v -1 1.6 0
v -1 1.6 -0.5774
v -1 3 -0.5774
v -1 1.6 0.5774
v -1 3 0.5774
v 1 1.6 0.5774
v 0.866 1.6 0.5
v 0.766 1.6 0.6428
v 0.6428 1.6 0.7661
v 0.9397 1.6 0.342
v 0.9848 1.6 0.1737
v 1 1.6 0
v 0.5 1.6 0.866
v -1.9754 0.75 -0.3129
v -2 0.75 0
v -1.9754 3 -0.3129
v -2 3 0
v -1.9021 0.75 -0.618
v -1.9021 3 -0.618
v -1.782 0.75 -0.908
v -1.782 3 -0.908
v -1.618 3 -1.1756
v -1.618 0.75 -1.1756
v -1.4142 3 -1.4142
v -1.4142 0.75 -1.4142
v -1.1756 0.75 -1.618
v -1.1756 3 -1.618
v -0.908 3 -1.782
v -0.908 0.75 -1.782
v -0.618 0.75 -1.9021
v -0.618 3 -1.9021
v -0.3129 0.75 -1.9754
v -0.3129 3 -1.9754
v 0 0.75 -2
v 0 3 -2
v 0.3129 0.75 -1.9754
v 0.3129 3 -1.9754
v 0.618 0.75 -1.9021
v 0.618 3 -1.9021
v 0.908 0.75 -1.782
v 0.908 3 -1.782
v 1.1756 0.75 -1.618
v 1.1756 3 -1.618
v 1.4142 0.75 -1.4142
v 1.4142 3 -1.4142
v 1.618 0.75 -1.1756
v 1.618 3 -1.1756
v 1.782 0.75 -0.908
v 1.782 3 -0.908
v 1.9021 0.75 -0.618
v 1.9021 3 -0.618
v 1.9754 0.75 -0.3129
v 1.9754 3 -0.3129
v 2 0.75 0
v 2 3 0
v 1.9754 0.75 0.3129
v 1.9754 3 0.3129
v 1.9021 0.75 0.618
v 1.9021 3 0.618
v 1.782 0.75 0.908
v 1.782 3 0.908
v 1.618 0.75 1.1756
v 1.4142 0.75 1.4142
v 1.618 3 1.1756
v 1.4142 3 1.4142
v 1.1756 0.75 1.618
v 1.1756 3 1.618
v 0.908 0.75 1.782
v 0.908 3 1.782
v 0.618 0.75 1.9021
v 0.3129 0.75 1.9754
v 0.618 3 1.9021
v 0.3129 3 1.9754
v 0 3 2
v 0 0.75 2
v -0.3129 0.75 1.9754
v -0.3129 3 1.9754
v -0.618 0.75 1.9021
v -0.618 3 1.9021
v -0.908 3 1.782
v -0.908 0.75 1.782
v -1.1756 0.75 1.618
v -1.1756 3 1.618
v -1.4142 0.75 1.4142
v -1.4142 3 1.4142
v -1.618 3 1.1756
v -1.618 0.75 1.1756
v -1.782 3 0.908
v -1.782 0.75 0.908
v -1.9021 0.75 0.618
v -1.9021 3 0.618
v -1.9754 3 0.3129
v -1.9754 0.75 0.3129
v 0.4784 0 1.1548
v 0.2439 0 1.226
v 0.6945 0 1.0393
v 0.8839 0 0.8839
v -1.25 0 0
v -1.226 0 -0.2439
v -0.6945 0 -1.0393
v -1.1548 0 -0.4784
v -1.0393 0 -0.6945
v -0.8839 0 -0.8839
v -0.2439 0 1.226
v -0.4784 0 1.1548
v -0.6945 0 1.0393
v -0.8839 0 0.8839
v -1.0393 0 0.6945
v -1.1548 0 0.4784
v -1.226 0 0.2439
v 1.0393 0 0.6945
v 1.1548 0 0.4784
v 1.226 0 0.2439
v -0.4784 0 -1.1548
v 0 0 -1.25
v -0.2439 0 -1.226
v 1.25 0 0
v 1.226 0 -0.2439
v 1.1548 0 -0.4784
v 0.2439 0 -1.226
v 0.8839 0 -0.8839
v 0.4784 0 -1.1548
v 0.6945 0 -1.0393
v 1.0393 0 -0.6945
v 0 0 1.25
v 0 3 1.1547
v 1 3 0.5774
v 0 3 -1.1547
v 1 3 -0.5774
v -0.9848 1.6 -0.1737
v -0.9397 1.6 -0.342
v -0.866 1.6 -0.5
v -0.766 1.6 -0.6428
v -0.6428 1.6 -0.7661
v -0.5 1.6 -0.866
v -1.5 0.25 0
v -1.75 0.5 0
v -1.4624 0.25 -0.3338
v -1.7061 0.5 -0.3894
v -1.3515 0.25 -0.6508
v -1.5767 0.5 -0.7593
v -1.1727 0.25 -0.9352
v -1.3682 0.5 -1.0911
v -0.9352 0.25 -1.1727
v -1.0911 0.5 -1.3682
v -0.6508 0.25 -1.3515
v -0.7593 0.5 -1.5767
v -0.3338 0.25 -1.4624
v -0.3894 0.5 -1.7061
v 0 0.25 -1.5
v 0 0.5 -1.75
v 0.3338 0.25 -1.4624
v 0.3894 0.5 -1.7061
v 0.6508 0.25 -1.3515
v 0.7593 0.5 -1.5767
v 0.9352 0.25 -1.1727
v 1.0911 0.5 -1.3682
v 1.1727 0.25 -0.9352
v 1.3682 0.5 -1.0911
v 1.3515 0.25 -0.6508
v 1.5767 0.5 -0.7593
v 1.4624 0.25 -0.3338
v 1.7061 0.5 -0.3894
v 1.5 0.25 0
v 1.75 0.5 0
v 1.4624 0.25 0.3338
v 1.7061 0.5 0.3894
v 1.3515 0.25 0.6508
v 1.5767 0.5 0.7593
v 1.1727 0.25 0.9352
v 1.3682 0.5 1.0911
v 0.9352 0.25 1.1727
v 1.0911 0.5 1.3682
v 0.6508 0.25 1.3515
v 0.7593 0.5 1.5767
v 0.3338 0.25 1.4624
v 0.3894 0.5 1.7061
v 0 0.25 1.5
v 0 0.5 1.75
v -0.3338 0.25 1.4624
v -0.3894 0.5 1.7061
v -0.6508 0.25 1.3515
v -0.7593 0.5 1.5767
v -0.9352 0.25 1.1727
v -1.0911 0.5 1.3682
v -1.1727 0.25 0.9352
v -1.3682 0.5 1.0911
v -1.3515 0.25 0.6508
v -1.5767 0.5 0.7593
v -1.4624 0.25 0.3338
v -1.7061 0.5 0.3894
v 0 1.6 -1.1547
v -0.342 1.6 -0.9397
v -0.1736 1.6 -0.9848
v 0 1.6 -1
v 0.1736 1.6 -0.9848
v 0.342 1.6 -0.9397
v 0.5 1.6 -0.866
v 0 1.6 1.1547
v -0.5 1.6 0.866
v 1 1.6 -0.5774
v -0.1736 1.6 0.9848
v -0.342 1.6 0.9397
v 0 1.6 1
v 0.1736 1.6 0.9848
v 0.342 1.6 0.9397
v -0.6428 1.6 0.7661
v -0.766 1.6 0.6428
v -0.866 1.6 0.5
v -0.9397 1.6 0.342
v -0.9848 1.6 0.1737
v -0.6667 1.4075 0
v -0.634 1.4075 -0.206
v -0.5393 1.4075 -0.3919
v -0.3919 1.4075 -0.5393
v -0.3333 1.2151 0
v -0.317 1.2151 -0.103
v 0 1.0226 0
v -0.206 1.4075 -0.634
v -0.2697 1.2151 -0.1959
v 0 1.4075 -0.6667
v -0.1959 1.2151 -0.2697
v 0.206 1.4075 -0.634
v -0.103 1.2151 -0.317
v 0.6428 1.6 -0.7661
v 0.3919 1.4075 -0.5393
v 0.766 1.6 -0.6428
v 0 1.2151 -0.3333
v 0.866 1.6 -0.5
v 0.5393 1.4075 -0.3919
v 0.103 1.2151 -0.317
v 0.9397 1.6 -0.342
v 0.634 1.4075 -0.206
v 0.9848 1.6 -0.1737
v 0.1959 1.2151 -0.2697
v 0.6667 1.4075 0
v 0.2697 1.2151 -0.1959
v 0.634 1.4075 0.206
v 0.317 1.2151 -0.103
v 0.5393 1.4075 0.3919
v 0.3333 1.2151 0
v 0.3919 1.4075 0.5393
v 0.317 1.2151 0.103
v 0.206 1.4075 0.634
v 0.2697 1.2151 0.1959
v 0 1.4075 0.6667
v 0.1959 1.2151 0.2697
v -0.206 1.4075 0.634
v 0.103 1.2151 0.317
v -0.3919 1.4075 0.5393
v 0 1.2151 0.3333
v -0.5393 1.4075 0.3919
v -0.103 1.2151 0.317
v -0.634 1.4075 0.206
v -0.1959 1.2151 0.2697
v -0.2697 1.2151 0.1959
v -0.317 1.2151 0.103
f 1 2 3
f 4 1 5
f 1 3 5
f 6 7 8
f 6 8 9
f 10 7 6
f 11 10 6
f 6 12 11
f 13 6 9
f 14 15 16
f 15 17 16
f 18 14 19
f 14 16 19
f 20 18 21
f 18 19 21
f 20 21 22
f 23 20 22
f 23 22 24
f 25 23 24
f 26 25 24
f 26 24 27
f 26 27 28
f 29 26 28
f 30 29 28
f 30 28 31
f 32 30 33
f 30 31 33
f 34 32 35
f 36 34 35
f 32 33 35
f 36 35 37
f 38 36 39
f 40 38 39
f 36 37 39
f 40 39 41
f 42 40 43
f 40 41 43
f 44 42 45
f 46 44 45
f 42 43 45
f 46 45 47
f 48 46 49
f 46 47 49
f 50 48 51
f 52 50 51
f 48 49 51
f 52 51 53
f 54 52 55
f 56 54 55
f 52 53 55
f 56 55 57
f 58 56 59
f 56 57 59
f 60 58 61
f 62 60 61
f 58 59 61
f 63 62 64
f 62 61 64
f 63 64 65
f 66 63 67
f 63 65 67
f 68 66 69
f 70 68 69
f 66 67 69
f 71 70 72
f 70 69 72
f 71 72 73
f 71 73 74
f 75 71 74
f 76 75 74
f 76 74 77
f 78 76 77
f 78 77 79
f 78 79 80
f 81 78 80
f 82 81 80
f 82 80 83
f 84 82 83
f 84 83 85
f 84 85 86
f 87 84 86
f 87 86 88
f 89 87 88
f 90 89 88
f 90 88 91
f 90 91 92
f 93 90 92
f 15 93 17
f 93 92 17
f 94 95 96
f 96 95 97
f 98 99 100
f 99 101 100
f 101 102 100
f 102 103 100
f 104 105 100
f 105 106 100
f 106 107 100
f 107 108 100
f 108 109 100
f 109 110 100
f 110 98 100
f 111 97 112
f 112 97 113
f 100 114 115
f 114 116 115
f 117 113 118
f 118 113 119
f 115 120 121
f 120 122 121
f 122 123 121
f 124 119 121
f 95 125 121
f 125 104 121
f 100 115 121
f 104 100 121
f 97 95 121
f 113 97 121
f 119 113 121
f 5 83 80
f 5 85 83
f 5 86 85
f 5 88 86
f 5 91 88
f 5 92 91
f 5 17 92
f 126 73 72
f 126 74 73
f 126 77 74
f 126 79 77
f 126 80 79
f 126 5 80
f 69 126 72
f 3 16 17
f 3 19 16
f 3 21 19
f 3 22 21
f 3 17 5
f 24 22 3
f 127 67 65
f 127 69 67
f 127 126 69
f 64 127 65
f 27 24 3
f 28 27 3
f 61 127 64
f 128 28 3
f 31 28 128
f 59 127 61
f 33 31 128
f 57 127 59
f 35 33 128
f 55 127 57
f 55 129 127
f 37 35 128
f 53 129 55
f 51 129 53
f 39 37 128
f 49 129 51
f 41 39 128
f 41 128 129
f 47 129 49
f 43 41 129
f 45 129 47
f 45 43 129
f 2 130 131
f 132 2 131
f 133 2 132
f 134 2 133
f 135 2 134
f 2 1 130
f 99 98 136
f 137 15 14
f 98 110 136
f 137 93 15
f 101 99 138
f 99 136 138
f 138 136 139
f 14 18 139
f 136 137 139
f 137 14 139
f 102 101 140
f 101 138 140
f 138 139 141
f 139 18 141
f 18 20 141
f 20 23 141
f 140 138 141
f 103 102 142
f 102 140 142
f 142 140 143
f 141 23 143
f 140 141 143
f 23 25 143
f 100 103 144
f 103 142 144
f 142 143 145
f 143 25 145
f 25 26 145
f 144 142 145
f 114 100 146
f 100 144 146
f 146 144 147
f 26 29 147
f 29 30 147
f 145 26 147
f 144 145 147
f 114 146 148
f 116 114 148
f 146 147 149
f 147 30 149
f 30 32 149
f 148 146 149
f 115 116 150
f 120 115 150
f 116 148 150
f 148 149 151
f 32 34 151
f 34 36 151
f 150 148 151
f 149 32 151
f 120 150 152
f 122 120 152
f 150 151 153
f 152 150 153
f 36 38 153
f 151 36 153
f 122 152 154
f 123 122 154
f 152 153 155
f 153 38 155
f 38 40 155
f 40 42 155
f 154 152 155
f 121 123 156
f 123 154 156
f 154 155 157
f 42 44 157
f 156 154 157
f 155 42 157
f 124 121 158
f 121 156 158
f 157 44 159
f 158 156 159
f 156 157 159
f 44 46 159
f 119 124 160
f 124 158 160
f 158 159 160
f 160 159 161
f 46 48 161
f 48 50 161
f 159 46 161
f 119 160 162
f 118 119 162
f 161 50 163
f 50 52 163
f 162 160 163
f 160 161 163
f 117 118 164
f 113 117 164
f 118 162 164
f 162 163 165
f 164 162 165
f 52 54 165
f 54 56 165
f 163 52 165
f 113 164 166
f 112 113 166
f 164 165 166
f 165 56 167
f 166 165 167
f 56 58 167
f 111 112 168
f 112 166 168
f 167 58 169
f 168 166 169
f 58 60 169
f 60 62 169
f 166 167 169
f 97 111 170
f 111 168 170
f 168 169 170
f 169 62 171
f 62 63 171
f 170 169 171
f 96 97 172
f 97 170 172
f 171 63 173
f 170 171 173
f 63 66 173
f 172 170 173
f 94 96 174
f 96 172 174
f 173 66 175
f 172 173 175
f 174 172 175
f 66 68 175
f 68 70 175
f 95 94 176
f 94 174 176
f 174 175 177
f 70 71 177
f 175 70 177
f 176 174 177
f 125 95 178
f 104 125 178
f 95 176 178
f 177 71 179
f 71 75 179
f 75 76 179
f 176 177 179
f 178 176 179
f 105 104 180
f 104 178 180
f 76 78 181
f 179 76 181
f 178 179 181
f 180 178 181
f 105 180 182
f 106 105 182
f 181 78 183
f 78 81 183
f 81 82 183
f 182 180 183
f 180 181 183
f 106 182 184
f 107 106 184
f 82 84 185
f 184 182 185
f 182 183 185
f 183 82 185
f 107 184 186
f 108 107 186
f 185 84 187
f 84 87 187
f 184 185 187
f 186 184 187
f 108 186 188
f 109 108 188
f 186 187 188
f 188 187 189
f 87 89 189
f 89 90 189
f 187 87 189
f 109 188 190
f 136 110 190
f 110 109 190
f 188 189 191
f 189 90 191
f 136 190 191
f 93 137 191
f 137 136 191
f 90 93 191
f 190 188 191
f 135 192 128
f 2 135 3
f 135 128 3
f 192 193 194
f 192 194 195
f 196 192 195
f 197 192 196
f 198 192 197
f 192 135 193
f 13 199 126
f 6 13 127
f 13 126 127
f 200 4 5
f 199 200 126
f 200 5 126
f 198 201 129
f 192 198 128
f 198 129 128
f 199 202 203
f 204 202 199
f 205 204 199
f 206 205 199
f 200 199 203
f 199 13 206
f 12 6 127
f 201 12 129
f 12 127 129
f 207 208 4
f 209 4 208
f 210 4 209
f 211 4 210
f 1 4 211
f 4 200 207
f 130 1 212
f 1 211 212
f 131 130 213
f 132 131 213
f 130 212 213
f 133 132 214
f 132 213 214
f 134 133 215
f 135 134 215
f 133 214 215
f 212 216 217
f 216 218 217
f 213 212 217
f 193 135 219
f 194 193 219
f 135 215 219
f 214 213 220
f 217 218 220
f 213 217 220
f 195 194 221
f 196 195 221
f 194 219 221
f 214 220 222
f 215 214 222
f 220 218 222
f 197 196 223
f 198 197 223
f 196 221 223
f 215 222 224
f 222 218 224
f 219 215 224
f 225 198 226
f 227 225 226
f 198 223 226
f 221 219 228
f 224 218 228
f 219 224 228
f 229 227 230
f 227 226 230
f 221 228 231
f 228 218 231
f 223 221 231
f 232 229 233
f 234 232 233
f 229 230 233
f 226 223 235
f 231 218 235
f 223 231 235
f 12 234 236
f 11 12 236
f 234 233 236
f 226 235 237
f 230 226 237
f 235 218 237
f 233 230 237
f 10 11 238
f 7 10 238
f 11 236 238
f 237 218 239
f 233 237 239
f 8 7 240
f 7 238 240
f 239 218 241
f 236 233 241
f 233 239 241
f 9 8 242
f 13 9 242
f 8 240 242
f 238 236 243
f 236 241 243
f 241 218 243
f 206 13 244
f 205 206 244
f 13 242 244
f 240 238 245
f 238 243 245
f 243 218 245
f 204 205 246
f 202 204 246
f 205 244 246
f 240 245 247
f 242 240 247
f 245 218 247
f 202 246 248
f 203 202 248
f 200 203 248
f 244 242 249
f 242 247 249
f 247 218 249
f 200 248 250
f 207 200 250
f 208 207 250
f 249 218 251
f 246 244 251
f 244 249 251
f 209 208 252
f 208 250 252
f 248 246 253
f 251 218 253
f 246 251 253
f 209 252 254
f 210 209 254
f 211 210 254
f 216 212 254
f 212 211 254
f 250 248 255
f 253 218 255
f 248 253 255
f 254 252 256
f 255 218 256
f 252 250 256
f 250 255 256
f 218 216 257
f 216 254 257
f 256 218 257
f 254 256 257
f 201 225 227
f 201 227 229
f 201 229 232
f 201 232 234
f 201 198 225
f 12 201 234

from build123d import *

# Parameters (mm, degrees)
SKETCH1_W          = 2
SKETCH1_H          = 3
CUT_EXTRUDE1_DEPTH = 1.4


with BuildPart() as part:
    # Sketch1 → Revolve1 (revolve)
    with BuildSketch(Plane.XY, mode=Mode.PRIVATE) as revolve1_sk:
        with Locations((1, 1.5)):
            Rectangle(SKETCH1_W, SKETCH1_H)
    revolve(revolve1_sk.sketch.rotate(Axis((0, 3, 0), (0, -1, 0)), 180), axis=Axis((0, 3, 0), (0, -1, 0)))

    # Sketch2 → Cut-Revolve1 (revolve, cut)
    with BuildSketch(Plane.XY, mode=Mode.PRIVATE) as cut_revolve1_sk:
        Polygon((0, 3), (1, 3), (1, 1.6), (0, 1.022649731), align=None)
    revolve(cut_revolve1_sk.sketch.rotate(Axis((0, 3, 0), (0, -1, 0)), 180), axis=Axis((0, 3, 0), (0, -1, 0)), mode=Mode.SUBTRACT)

    # Sketch3 → Cut-Extrude1 (cut)
    with BuildSketch(Plane(origin=(0, 3, 0), x_dir=(1, 0, 0), z_dir=(0, 1, 0))):
        Polygon((0, 1.154700538), (-1, 0.577350269), (-1, -0.577350269), (0, -1.154700538), (1, -0.577350269), (1, 0.577350269), align=None)
    extrude(amount=-CUT_EXTRUDE1_DEPTH, mode=Mode.SUBTRACT)

    # Sketch4 → Cut-Revolve2 (revolve, cut)
    with BuildSketch(Plane.XY, mode=Mode.PRIVATE) as cut_revolve2_sk:
        Polygon((2, 0.75), (2, 0), (1.25, 0), align=None)
    revolve(cut_revolve2_sk.sketch.rotate(Axis((0, 3, 0), (0, -1, 0)), 180), axis=Axis((0, 3, 0), (0, -1, 0)), mode=Mode.SUBTRACT)


solid = part.part
